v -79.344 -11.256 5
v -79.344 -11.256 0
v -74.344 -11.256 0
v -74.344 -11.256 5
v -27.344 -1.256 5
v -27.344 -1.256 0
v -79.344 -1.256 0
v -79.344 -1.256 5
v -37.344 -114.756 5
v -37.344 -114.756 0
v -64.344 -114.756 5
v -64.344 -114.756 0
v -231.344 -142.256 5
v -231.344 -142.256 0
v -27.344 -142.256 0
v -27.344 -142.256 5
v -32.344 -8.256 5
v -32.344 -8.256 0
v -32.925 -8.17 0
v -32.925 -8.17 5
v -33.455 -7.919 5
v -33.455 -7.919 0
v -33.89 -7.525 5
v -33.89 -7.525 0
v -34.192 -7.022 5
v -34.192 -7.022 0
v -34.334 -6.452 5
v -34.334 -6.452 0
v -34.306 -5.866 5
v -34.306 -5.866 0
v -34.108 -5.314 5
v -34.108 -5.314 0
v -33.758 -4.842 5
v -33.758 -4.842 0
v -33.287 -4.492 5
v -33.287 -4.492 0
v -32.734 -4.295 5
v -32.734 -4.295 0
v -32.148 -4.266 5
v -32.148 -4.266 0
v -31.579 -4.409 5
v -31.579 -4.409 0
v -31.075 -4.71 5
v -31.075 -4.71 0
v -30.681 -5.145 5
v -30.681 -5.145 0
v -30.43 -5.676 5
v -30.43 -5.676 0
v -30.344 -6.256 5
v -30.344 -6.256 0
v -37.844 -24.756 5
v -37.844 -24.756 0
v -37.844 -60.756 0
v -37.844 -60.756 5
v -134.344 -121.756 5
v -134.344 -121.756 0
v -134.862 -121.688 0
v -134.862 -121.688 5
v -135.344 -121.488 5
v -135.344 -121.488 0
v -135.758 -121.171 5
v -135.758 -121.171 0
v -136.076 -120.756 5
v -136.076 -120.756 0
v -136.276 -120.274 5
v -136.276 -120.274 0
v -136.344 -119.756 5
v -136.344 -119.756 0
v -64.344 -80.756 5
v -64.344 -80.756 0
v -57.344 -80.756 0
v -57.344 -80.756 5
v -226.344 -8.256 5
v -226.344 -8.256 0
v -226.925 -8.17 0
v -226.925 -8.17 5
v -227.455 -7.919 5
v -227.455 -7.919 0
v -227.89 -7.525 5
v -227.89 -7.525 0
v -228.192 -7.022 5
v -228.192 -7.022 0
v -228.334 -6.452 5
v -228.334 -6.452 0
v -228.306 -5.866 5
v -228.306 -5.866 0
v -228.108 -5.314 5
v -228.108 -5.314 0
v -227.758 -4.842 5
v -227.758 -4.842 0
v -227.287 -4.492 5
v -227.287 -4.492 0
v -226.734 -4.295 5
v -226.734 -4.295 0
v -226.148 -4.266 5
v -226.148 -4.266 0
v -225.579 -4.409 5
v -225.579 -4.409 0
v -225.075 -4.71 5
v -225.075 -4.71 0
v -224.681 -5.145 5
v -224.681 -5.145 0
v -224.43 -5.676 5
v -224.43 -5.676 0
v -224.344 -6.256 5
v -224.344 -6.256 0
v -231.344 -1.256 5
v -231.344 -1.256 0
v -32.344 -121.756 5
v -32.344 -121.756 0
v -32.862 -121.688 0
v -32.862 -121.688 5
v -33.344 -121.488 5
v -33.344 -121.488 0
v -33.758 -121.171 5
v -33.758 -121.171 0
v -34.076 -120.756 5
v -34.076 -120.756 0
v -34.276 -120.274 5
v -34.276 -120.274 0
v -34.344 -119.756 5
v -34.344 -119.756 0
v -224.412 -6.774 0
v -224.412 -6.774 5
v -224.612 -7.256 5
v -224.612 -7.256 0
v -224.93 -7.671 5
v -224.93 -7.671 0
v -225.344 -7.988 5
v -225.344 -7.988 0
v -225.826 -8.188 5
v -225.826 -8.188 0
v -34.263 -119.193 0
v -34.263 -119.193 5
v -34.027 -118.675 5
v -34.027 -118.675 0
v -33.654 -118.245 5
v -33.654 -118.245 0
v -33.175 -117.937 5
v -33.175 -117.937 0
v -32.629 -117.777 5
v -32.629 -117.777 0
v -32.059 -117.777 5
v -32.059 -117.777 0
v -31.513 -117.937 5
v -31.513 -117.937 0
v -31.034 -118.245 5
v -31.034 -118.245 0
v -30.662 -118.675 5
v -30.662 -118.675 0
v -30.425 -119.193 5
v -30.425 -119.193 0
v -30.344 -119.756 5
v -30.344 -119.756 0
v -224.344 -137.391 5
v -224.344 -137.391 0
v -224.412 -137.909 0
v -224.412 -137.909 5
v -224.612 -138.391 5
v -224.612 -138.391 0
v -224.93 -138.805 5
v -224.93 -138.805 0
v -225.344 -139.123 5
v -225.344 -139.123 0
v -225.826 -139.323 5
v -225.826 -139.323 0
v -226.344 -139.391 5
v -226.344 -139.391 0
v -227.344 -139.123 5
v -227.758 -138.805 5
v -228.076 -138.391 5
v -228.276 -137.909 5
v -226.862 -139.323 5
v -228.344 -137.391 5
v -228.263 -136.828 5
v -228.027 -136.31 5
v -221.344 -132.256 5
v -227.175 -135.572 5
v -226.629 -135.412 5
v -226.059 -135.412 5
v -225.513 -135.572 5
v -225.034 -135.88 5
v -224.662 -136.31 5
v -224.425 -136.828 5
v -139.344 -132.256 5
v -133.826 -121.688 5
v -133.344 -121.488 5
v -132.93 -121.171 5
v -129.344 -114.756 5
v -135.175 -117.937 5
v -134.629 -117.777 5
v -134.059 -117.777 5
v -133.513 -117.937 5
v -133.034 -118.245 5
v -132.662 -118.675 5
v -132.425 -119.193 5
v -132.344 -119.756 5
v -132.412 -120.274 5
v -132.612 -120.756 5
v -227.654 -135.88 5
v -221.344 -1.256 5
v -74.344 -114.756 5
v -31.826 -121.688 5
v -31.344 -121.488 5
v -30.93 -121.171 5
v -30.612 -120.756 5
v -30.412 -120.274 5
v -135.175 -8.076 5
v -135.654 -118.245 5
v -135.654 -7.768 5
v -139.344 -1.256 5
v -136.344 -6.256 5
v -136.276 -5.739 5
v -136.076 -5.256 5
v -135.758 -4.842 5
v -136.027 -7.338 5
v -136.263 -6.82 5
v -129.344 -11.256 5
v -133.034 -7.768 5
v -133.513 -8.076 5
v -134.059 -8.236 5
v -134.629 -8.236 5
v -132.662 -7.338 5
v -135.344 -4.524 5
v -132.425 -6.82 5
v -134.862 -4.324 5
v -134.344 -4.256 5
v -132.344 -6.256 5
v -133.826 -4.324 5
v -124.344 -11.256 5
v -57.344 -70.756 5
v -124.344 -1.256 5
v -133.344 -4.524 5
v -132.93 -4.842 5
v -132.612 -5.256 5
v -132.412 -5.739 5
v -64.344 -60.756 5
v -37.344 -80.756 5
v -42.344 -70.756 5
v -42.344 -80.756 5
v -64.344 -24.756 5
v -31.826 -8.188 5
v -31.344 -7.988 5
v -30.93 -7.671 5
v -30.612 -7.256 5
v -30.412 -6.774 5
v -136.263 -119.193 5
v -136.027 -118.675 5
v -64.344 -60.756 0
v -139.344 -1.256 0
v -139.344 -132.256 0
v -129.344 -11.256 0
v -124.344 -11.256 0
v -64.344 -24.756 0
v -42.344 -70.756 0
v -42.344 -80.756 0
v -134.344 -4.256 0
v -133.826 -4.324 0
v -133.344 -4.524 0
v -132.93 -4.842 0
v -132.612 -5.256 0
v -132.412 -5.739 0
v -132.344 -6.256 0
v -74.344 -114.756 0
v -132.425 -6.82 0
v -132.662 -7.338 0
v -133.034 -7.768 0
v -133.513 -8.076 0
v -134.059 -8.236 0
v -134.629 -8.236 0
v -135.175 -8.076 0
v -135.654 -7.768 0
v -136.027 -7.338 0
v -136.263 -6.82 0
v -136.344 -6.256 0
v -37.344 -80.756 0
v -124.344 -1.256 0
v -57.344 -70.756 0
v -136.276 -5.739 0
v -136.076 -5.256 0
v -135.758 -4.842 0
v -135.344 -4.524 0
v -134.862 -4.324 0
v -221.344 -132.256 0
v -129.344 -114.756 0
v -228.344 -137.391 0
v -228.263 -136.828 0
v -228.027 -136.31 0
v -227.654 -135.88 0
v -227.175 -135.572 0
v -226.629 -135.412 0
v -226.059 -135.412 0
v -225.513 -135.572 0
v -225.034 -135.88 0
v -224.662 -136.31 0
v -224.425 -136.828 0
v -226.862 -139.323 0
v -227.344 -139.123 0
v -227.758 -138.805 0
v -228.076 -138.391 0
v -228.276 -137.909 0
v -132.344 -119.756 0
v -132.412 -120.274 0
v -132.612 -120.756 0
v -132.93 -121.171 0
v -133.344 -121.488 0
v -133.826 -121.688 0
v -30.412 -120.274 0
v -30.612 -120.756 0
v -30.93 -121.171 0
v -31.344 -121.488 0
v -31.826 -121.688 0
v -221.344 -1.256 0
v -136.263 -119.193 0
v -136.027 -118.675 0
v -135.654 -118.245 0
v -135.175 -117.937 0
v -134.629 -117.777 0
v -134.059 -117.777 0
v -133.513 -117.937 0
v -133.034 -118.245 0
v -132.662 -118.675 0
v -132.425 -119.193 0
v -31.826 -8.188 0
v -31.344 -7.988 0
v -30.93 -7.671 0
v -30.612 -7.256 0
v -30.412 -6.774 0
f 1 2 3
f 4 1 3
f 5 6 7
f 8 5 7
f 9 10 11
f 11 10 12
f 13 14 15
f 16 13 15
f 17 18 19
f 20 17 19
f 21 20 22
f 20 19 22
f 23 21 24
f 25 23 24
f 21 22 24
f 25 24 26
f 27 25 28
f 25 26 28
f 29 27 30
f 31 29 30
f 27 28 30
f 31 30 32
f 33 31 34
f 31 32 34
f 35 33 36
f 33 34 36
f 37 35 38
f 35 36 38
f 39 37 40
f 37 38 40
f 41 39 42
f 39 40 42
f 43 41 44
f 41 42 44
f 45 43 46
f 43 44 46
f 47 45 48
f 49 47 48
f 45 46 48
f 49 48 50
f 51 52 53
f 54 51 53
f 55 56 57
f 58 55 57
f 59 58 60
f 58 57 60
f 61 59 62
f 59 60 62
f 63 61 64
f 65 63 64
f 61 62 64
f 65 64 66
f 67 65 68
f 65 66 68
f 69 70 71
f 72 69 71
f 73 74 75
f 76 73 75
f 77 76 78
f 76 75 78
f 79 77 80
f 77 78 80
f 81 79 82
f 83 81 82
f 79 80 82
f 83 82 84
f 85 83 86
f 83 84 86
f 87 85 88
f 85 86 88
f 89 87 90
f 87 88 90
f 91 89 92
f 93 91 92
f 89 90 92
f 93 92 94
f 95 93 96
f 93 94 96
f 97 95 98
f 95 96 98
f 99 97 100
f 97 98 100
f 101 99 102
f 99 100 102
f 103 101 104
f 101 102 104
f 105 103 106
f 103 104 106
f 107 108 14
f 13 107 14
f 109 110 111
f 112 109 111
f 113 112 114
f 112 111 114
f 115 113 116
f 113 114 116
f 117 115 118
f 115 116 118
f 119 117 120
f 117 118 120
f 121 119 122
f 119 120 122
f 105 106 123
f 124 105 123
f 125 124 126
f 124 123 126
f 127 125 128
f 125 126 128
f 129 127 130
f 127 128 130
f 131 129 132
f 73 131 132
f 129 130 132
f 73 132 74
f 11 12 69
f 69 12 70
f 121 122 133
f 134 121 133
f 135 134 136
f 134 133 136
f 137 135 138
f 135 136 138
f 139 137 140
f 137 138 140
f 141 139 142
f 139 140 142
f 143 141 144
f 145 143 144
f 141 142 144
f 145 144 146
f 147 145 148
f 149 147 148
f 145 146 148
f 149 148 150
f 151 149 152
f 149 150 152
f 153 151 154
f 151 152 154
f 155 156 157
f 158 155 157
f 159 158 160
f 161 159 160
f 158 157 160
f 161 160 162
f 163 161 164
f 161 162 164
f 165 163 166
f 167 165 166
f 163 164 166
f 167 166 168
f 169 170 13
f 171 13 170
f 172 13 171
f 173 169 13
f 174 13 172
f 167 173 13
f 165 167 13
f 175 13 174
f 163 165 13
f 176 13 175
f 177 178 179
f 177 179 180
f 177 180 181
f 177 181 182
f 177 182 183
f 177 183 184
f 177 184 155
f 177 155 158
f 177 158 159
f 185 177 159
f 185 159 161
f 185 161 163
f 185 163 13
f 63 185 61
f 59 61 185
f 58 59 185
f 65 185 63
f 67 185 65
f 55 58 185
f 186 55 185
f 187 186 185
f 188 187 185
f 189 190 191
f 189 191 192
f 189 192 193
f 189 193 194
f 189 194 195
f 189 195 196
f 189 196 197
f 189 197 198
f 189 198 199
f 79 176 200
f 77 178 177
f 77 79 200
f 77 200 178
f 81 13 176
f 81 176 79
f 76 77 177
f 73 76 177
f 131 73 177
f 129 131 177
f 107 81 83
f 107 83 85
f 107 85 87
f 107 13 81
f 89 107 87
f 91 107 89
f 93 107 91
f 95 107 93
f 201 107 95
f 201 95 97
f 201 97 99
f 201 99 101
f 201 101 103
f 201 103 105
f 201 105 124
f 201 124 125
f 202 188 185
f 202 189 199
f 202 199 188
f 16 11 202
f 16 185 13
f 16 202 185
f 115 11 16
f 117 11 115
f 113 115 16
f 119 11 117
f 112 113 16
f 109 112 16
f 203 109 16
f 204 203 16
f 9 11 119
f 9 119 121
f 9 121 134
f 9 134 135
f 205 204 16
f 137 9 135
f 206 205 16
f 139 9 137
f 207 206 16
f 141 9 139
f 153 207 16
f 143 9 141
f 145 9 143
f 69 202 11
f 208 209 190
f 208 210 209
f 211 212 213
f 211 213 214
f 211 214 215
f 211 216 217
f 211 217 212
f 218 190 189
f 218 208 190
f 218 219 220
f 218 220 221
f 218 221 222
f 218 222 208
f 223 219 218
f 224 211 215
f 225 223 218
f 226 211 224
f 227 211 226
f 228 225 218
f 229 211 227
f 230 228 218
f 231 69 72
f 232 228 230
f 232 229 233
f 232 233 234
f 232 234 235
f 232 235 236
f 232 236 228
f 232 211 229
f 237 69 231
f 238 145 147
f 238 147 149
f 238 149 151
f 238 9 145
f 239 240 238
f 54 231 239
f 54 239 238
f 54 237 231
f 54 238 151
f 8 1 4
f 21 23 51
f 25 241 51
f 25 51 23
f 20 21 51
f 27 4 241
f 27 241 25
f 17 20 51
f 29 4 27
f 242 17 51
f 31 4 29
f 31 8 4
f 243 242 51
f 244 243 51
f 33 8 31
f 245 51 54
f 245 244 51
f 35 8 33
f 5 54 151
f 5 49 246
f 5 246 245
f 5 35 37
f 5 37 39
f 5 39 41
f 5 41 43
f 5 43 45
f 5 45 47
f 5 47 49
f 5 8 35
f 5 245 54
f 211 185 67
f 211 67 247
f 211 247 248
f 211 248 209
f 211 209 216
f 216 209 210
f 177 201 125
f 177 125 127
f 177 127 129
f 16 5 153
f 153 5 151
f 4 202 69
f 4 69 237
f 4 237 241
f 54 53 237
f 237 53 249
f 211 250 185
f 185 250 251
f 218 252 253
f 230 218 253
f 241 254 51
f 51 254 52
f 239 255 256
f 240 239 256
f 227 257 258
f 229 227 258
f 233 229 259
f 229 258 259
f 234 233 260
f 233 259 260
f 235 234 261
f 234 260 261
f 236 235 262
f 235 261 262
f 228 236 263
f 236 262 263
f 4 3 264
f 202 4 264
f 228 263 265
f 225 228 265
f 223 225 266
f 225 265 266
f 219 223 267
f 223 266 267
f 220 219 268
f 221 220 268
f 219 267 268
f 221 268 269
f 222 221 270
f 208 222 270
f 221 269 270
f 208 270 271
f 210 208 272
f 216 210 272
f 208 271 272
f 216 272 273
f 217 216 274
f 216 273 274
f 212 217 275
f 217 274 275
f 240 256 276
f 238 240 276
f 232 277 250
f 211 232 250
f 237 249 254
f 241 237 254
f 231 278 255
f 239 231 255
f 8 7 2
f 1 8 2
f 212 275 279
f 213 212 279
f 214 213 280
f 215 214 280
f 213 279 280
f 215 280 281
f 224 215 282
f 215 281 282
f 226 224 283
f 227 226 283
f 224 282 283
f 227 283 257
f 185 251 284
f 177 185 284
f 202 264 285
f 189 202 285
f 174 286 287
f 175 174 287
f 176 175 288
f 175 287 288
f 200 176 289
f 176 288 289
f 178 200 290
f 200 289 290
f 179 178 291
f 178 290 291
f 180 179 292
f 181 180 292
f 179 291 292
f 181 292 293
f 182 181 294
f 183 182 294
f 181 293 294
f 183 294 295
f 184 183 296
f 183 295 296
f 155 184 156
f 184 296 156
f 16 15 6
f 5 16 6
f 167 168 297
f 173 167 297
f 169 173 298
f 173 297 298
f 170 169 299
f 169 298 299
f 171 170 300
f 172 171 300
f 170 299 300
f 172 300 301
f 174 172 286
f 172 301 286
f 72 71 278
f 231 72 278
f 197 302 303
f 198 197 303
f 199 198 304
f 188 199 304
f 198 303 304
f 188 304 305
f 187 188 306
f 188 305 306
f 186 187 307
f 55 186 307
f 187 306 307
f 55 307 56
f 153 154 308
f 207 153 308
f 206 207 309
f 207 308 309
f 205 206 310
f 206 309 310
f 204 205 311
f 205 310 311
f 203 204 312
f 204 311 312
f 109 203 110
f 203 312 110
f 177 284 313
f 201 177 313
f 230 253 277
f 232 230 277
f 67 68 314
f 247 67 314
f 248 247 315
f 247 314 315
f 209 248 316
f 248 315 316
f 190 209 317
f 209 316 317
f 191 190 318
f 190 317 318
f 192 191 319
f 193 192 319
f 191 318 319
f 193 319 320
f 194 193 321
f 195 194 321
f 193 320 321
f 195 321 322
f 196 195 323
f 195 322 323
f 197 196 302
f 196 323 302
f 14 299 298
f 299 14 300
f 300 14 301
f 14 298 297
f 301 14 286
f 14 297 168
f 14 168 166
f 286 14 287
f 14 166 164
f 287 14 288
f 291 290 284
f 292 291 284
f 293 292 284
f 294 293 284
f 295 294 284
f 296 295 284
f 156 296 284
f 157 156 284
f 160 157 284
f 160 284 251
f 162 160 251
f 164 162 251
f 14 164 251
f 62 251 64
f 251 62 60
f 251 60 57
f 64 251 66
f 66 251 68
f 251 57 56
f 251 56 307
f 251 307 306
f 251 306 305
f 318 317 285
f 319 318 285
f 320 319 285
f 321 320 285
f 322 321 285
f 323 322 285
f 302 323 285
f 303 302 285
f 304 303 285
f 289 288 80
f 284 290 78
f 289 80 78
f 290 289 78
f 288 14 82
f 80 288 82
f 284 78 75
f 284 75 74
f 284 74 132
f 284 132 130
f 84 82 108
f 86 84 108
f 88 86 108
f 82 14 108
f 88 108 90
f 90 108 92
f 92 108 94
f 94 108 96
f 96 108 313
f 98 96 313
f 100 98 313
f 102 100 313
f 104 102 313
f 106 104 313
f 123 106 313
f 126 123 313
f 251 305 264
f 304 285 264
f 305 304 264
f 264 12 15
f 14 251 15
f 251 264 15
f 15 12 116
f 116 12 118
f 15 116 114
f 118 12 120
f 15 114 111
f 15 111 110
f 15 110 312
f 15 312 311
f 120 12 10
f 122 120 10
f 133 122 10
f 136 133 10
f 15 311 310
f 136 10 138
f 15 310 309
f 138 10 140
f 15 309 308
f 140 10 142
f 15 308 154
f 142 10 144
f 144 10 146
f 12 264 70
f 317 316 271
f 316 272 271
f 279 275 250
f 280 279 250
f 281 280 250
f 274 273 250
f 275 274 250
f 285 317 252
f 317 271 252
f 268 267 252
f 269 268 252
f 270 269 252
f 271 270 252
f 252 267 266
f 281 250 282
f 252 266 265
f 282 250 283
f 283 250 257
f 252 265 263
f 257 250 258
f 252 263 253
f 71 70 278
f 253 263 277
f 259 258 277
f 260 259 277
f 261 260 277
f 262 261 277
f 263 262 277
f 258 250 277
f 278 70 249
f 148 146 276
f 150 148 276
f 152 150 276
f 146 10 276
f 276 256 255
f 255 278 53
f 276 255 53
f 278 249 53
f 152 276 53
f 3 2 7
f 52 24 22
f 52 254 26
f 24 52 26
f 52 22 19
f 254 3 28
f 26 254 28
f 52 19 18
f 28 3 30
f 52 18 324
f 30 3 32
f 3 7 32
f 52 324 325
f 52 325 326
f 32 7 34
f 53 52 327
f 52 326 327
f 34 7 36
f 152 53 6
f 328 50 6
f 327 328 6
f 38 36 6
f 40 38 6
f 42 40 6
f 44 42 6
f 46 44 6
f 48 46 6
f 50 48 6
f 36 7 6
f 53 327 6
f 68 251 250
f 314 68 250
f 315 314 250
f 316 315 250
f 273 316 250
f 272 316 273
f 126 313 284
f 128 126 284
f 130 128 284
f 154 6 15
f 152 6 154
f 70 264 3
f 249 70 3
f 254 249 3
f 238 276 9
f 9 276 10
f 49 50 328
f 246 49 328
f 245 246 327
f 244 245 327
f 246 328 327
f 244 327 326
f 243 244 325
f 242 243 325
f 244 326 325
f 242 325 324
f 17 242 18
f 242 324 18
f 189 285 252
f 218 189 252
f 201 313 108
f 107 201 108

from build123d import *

# Parameters (mm, degrees)
F1_DEPTH = 5


# Not quite as in the source:
# - a feature names something its author has since deleted; it is built from what else it names


with BuildPart() as f1:
    # F0 (on Top) → F1 (new body)
    with BuildSketch(Plane.XY):
        with BuildLine():
            Line((-134.3440142274, -1.256315279), (-139.3440142274, -1.256315279))
            Line((-139.3440142274, -1.256315279), (-139.3440142274, -6.256315279))
            Line((-139.3440142274, -6.256315279), (-136.3440142274, -6.256315279))
            ThreePointArc((-136.3440142274, -6.256315279), (-135.7582277898, -4.8421017166), (-134.3440142274, -4.256315279))
            Line((-134.3440142274, -4.256315279), (-134.3440142274, -1.256315279))
        make_face()
        with BuildLine():
            Line((-129.3440142274, -1.256315279), (-134.3440142274, -1.256315279))
            Line((-134.3440142274, -1.256315279), (-134.3440142274, -4.256315279))
            ThreePointArc((-134.3440142274, -4.256315279), (-132.929800665, -4.8421017166), (-132.3440142274, -6.256315279))
            ThreePointArc((-132.3440142274, -6.256315279), (-134.3440142274, -8.256315279), (-136.3440142274, -6.256315279))
            Line((-136.3440142274, -6.256315279), (-139.3440142274, -6.256315279))
            Line((-139.3440142274, -6.256315279), (-139.3440142274, -11.256315279))
            Line((-139.3440142274, -11.256315279), (-129.3440142274, -11.256315279))
            Line((-129.3440142274, -11.256315279), (-129.3440142274, -1.256315279))
        make_face()
        with BuildLine():
            Line((-221.3440142274, -6.256315279), (-221.3440142274, -1.256315279))
            Line((-221.3440142274, -1.256315279), (-231.3440142274, -1.256315279))
            Line((-231.3440142274, -1.256315279), (-231.3440142274, -132.256315279))
            Line((-231.3440142274, -132.256315279), (-221.3440142274, -132.256315279))
            Line((-221.3440142274, -132.256315279), (-221.3440142274, -128.856315279))
            Line((-221.3440142274, -128.856315279), (-221.3440142274, -14.656315279))
            Line((-221.3440142274, -14.656315279), (-221.3440142274, -11.256315279))
            Line((-221.3440142274, -11.256315279), (-226.3440142274, -11.256315279))
            Line((-226.3440142274, -11.256315279), (-226.3440142274, -8.256315279))
            ThreePointArc((-226.3440142274, -8.256315279), (-227.7582277898, -4.8421017166), (-224.3440142274, -6.256315279))
            Line((-224.3440142274, -6.256315279), (-221.3440142274, -6.256315279))
        make_face()
        Polygon((-124.3440142274, -1.256315279), (-129.3440142274, -1.256315279), (-129.3440142274, -11.256315279), (-126.5440142274, -11.256315279), (-126.3440142274, -11.256315279), (-124.3440142274, -11.256315279), align=None)
        Polygon((-129.3440142274, -11.256315279), (-139.3440142274, -11.256315279), (-139.3440142274, -14.656315279), (-139.3440142274, -114.756315279), (-129.3440142274, -114.756315279), (-129.3440142274, -111.756315279), (-129.3440142274, -108.756315279), (-129.3440142274, -27.956315279), (-129.3440142274, -27.456315279), (-129.3440142274, -14.056315279), align=None)
        with BuildLine():
            Line((-221.3440142274, -11.256315279), (-221.3440142274, -6.256315279))
            Line((-221.3440142274, -6.256315279), (-224.3440142274, -6.256315279))
            ThreePointArc((-224.3440142274, -6.256315279), (-224.929800665, -7.6705288414), (-226.3440142274, -8.256315279))
            Line((-226.3440142274, -8.256315279), (-226.3440142274, -11.256315279))
            Line((-226.3440142274, -11.256315279), (-221.3440142274, -11.256315279))
        make_face()
        with BuildLine():
            Line((-221.3440142274, -132.256315279), (-231.3440142274, -132.256315279))
            Line((-231.3440142274, -132.256315279), (-231.3440142274, -137.3912245035))
            Line((-231.3440142274, -137.3912245035), (-228.3440142274, -137.3912245035))
            ThreePointArc((-228.3440142274, -137.3912245035), (-226.3440142274, -135.3912245035), (-224.3440142274, -137.3912245035))
            ThreePointArc((-224.3440142274, -137.3912245035), (-224.929800665, -138.8054380659), (-226.3440142274, -139.3912245035))
            Line((-226.3440142274, -139.3912245035), (-226.3440142274, -142.256315279))
            Line((-226.3440142274, -142.256315279), (-221.3440142274, -142.256315279))
            Line((-221.3440142274, -142.256315279), (-221.3440142274, -132.256315279))
        make_face()
        with BuildLine():
            Line((-129.3440142274, -114.756315279), (-139.3440142274, -114.756315279))
            Line((-139.3440142274, -114.756315279), (-139.3440142274, -119.756315279))
            Line((-139.3440142274, -119.756315279), (-136.3440142274, -119.756315279))
            ThreePointArc((-136.3440142274, -119.756315279), (-134.3440142274, -117.756315279), (-132.3440142274, -119.756315279))
            ThreePointArc((-132.3440142274, -119.756315279), (-132.929800665, -121.1705288414), (-134.3440142274, -121.756315279))
            Line((-134.3440142274, -121.756315279), (-134.3440142274, -124.756315279))
            Line((-134.3440142274, -124.756315279), (-129.3440142274, -124.756315279))
            Line((-129.3440142274, -124.756315279), (-129.3440142274, -114.756315279))
        make_face()
        Polygon((-217.9440142274, -132.256315279), (-221.3440142274, -132.256315279), (-221.3440142274, -142.256315279), (-139.3440142274, -142.256315279), (-139.4949736476, -132.256315279), (-142.7440142274, -132.256315279), (-147.4240142274, -132.256315279), (-151.4240142274, -132.256315279), align=None)
        with BuildLine():
            Line((-228.3440142274, -137.3912245035), (-231.3440142274, -137.3912245035))
            Line((-231.3440142274, -137.3912245035), (-231.3440142274, -142.256315279))
            Line((-231.3440142274, -142.256315279), (-226.3440142274, -142.256315279))
            Line((-226.3440142274, -142.256315279), (-226.3440142274, -139.3912245035))
            ThreePointArc((-226.3440142274, -139.3912245035), (-227.7582277898, -138.8054380659), (-228.3440142274, -137.3912245035))
        make_face()
        with BuildLine():
            Line((-79.3440142274, -1.256315279), (-79.3440142274, -11.256315279))
            Line((-79.3440142274, -11.256315279), (-77.3440142274, -11.256315279))
            Line((-77.3440142274, -11.256315279), (-74.3440142274, -11.256315279))
            Line((-74.3440142274, -11.256315279), (-32.3440142274, -11.256315279))
            Line((-32.3440142274, -11.256315279), (-32.3440142274, -8.256315279))
            ThreePointArc((-32.3440142274, -8.256315279), (-33.7582277898, -4.8421017166), (-30.3440142274, -6.256315279))
            Line((-30.3440142274, -6.256315279), (-27.3440142274, -6.256315279))
            Line((-27.3440142274, -6.256315279), (-27.3440142274, -1.256315279))
            Line((-27.3440142274, -1.256315279), (-79.3440142274, -1.256315279))
        make_face()
        Polygon((-126.3440142274, -114.756315279), (-129.3440142274, -114.756315279), (-129.3440142274, -124.756315279), (-74.3440142274, -124.756315279), (-74.3440142274, -114.756315279), (-77.1940142274, -114.756315279), (-77.3440142274, -114.756315279), align=None)
        with BuildLine():
            Line((-136.3440142274, -119.756315279), (-139.3440142274, -119.756315279))
            Line((-139.3440142274, -119.756315279), (-139.3440142274, -124.756315279))
            Line((-139.3440142274, -124.756315279), (-139.1930548072, -124.756315279))
            Line((-139.1930548072, -124.756315279), (-134.3440142274, -124.756315279))
            Line((-134.3440142274, -124.756315279), (-134.3440142274, -121.756315279))
            ThreePointArc((-134.3440142274, -121.756315279), (-135.7582277898, -121.1705288414), (-136.3440142274, -119.756315279))
        make_face()
        Polygon((-139.3440142274, -132.256315279), (-139.4949736476, -132.256315279), (-139.3440142274, -142.256315279), (-129.3440142274, -142.256315279), (-129.3440142274, -124.756315279), (-134.3440142274, -124.756315279), (-139.1930548072, -124.756315279), (-139.3440142274, -124.756315279), (-139.3440142274, -128.856315279), align=None)
        Polygon((-74.3440142274, -124.756315279), (-129.3440142274, -124.756315279), (-129.3440142274, -142.256315279), (-77.3440142274, -142.256315279), (-74.3440142274, -142.256315279), align=None)
        Polygon((-32.3440142274, -11.256315279), (-74.3440142274, -11.256315279), (-74.3440142274, -14.256315279), (-74.3440142274, -26.056315279), (-74.3440142274, -103.156315279), (-74.3440142274, -111.906315279), (-74.3440142274, -114.756315279), (-64.3440142274, -114.756315279), (-64.3440142274, -105.506315279), (-64.3440142274, -82.706315279), (-64.3440142274, -80.756315279), (-64.3440142274, -60.756315279), (-64.3440142274, -59.006315279), (-64.3440142274, -26.456315279), (-64.3440142274, -24.756315279), (-62.6440142274, -24.756315279), (-39.5440142274, -24.756315279), (-37.8440142274, -24.756315279), (-27.3440142274, -24.756315279), (-27.3440142274, -14.656315279), (-27.3440142274, -11.256315279), align=None)
        with BuildLine():
            Line((-27.3440142274, -11.256315279), (-27.3440142274, -6.256315279))
            Line((-27.3440142274, -6.256315279), (-30.3440142274, -6.256315279))
            ThreePointArc((-30.3440142274, -6.256315279), (-30.929800665, -7.6705288414), (-32.3440142274, -8.256315279))
            Line((-32.3440142274, -8.256315279), (-32.3440142274, -11.256315279))
            Line((-32.3440142274, -11.256315279), (-27.3440142274, -11.256315279))
        make_face()
        Polygon((-74.3440142274, -114.756315279), (-74.3440142274, -124.756315279), (-37.3440142274, -124.756315279), (-37.3440142274, -119.756315279), (-37.3440142274, -114.756315279), (-39.2940142274, -114.756315279), (-62.3940142274, -114.756315279), (-64.3440142274, -114.756315279), align=None)
        Polygon((-37.3440142274, -124.756315279), (-74.3440142274, -124.756315279), (-74.3440142274, -142.256315279), (-27.3440142274, -142.256315279), (-27.3440142274, -124.756315279), (-32.3440142274, -124.756315279), align=None)
        with BuildLine():
            Line((-37.3440142274, -119.756315279), (-37.3440142274, -124.756315279))
            Line((-37.3440142274, -124.756315279), (-32.3440142274, -124.756315279))
            Line((-32.3440142274, -124.756315279), (-32.3440142274, -121.756315279))
            ThreePointArc((-32.3440142274, -121.756315279), (-33.7582277898, -121.1705288414), (-34.3440142274, -119.756315279))
            Line((-34.3440142274, -119.756315279), (-37.3440142274, -119.756315279))
        make_face()
        with BuildLine():
            Line((-32.3440142274, -121.756315279), (-32.3440142274, -124.756315279))
            Line((-32.3440142274, -124.756315279), (-27.3440142274, -124.756315279))
            Line((-27.3440142274, -124.756315279), (-27.3440142274, -114.756315279))
            Line((-27.3440142274, -114.756315279), (-37.3440142274, -114.756315279))
            Line((-37.3440142274, -114.756315279), (-37.3440142274, -119.756315279))
            Line((-37.3440142274, -119.756315279), (-34.3440142274, -119.756315279))
            ThreePointArc((-34.3440142274, -119.756315279), (-32.3440142274, -117.756315279), (-30.3440142274, -119.756315279))
            ThreePointArc((-30.3440142274, -119.756315279), (-30.929800665, -121.1705288414), (-32.3440142274, -121.756315279))
        make_face()
        Polygon((-27.3440142274, -114.756315279), (-27.3440142274, -24.756315279), (-37.8440142274, -24.756315279), (-37.8440142274, -26.456315279), (-37.8440142274, -59.006315279), (-37.8440142274, -60.756315279), (-39.5940142274, -60.756315279), (-62.5940142274, -60.756315279), (-64.3440142274, -60.756315279), (-64.3440142274, -80.756315279), (-62.3940142274, -80.756315279), (-57.3440142274, -80.756315279), (-57.3440142274, -70.756315279), (-42.3440142274, -70.756315279), (-42.3440142274, -80.756315279), (-39.2940142274, -80.756315279), (-37.3440142274, -80.756315279), (-37.3440142274, -82.706315279), (-37.3440142274, -105.506315279), (-37.3440142274, -114.756315279), align=None)
    extrude(amount=F1_DEPTH)


solid = f1.part
